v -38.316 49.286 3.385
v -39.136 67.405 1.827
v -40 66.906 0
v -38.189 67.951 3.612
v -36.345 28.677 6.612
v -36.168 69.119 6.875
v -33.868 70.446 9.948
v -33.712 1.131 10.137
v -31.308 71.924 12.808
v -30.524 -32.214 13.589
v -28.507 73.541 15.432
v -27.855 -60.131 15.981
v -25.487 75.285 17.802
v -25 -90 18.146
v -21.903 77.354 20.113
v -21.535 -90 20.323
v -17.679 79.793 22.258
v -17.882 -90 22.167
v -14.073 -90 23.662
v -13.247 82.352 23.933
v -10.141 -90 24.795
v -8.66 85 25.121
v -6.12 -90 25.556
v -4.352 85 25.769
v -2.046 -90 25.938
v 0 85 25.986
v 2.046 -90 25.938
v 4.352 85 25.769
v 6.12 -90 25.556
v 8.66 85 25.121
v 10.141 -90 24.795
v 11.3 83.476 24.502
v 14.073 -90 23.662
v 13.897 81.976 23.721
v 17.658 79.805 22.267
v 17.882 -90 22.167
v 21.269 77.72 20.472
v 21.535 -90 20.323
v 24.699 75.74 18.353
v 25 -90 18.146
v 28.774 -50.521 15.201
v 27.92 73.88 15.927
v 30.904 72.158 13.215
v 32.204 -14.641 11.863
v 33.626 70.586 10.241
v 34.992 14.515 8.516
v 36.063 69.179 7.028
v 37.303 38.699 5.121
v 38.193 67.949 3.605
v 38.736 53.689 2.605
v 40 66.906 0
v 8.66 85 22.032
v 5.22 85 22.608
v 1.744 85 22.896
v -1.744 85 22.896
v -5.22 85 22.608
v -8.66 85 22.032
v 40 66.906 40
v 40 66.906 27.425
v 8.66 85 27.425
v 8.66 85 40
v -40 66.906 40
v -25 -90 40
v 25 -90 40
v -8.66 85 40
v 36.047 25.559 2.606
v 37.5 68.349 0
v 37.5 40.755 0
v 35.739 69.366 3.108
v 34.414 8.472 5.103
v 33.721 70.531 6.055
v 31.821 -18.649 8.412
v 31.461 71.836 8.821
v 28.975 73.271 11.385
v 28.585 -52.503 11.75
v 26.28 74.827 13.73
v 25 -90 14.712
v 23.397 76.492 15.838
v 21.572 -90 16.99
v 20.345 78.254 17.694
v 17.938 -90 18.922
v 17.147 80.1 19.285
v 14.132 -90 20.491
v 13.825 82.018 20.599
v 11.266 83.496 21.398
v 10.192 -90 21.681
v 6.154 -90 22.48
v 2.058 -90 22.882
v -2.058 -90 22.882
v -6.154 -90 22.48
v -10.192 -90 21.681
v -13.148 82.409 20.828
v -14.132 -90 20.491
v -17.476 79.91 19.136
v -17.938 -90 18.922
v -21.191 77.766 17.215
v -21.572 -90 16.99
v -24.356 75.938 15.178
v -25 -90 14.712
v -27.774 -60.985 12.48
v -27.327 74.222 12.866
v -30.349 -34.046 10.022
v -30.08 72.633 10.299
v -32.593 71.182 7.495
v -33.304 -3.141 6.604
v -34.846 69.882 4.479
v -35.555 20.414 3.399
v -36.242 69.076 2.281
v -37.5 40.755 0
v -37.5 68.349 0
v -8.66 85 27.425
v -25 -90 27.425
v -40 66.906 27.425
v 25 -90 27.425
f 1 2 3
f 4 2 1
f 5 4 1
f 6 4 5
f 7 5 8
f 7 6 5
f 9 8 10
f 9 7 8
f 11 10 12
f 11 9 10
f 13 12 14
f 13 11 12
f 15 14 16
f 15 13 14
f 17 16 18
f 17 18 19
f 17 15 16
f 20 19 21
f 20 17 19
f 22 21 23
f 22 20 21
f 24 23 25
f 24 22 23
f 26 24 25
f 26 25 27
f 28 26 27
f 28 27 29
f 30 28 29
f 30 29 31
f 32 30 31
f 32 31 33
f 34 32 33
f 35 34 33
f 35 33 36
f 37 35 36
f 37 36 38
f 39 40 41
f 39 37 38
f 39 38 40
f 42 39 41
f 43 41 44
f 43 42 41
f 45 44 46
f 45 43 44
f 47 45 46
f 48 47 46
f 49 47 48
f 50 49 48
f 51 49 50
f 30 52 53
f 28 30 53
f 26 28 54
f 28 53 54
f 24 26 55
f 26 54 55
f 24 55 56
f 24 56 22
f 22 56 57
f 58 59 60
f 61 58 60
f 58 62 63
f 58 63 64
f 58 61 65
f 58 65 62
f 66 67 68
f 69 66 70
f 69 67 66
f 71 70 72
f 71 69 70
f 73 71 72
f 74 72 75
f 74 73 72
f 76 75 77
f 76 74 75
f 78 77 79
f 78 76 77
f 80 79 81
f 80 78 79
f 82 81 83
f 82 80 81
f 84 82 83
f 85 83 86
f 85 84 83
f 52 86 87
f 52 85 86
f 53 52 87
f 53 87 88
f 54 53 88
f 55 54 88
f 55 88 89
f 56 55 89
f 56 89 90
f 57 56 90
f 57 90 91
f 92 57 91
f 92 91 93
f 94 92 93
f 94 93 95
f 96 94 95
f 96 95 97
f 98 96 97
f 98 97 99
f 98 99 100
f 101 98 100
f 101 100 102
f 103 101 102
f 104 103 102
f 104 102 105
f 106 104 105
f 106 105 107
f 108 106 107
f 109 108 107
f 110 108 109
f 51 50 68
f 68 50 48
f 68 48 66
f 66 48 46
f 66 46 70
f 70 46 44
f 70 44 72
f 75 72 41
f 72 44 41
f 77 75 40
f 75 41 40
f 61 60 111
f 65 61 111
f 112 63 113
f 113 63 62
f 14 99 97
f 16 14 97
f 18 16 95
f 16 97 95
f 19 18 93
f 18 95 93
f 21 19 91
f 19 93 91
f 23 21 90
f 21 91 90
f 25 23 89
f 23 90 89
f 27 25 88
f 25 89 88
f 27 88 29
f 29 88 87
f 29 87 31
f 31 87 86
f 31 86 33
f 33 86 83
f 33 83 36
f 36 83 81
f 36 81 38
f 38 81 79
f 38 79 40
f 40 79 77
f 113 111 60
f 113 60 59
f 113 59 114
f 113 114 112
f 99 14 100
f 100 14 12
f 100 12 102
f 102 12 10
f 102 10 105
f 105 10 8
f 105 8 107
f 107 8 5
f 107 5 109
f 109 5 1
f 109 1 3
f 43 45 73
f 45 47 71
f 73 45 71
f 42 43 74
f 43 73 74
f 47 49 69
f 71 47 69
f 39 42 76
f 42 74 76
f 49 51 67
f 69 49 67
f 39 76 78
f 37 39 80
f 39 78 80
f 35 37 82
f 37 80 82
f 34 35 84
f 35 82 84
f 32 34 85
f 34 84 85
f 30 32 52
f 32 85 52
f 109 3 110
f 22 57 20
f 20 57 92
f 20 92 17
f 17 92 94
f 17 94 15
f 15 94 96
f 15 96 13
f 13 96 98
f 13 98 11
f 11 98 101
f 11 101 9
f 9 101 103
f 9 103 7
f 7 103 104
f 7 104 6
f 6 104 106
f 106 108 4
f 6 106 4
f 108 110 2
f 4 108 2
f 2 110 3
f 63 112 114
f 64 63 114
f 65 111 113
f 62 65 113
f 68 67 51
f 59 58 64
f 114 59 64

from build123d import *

# Parameters (mm, degrees)
F1_DEPTH = 40
F3_DEPTH = 85.001
F4_DEPTH = 90.001
F6_DEPTH = 40.001


with BuildPart() as f1:
    # F0 (on Top) → F1 (new body)
    with BuildSketch(Plane.XY):
        Polygon((-40, -90), (40, -90), (40, 66.905989), (8.660254, 85), (-8.660254, 85), (-40, 66.905989), align=None)
    extrude(amount=F1_DEPTH)

    # F2 (on Front) → F3 (cut, through all)
    with BuildSketch(Plane.XZ):
        with BuildLine():
            Line((-37.5, 0), (37.5, 0))
            ThreePointArc((37.5, 0), (0, 22.932187), (-37.5, 0))
        make_face()
        with BuildLine():
            ThreePointArc((-40, 0), (0, 25.985793), (40, 0))
            Line((40, 0), (40, 27.425041))
            Line((40, 27.425041), (-40, 27.425041))
            Line((-40, 27.425041), (-40, 0))
        make_face()
    extrude(amount=-F3_DEPTH, mode=Mode.SUBTRACT)

    # F2 (on Front) → F4 (cut, through all)
    with BuildSketch(Plane.XZ):
        with BuildLine():
            Line((-37.5, 0), (37.5, 0))
            ThreePointArc((37.5, 0), (0, 22.932187), (-37.5, 0))
        make_face()
        with BuildLine():
            ThreePointArc((-40, 0), (0, 25.985793), (40, 0))
            Line((40, 0), (40, 27.425041))
            Line((40, 27.425041), (-40, 27.425041))
            Line((-40, 27.425041), (-40, 0))
        make_face()
    extrude(amount=F4_DEPTH, mode=Mode.SUBTRACT)

    # F5 (on face) → F6 (cut, through all)
    with BuildSketch(Plane.XY.offset(40)):
        Polygon((-25, -90), (-40, 66.905989), (-40, -90), align=None)
        Polygon((40, 66.905989), (25, -90), (40, -90), align=None)
    extrude(amount=-F6_DEPTH, mode=Mode.SUBTRACT)


solid = f1.part
